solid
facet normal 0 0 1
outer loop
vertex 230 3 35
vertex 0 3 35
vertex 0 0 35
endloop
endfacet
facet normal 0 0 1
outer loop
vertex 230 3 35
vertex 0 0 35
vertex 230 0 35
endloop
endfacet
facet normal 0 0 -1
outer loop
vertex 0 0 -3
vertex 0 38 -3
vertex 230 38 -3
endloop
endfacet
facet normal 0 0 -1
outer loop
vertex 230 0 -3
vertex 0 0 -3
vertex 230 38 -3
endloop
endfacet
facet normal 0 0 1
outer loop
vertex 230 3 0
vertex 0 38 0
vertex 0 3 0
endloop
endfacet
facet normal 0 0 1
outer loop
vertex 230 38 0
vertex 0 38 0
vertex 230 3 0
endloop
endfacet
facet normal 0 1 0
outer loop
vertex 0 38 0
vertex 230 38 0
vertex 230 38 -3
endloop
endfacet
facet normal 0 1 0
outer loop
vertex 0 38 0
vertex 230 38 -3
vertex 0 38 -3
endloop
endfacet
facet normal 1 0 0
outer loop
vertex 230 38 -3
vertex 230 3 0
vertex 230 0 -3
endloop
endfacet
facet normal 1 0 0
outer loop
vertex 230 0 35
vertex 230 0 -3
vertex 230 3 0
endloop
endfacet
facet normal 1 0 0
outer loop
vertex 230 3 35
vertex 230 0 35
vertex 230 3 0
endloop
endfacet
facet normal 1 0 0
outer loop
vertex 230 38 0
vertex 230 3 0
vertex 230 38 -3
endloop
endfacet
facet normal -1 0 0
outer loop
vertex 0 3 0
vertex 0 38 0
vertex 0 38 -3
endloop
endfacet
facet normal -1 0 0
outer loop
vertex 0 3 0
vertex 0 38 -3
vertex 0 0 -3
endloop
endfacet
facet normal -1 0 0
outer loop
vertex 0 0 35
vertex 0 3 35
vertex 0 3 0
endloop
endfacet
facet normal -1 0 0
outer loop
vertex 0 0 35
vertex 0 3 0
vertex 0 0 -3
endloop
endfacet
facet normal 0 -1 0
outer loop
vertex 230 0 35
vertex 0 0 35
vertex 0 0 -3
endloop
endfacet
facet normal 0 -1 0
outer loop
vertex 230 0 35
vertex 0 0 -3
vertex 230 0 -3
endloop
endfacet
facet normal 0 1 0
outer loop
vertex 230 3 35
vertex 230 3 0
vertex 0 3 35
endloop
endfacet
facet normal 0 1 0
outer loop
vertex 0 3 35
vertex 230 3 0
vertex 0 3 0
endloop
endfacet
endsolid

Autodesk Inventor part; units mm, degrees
ref_plane "YZ Plane" through (0, 0, 0) normal (1, 0, 0) x (0, 1, 0)
ref_plane "XZ Plane" through (0, 0, 0) normal (0, 1, 0) x (-1, 0, 0)
ref_plane "XY Plane" through (0, 0, 0) normal (0, 0, 1) x (1, 0, 0)
sketch "Sketch1" plane through (0, 0, 0) normal (0, 0, 1) x (1, 0, 0)
  line L0 (0, 0) -> (230, 0)
  line L1 (230, 0) -> (230, 38)
  line L2 (230, 38) -> (0, 38)
  line L3 (0, 38) -> (0, 0)
  dimension "d0" = 230
  dimension "d1" = 38
extrude "Extrusion1" add sketch "Sketch1" against normal blind 3
sketch "Sketch2" plane through (0, 0, 0) normal (0, 0, 1) x (1, 0, 0)
  line L0 (0, 0) -> (0, 38) projected
  line L1 (0, 0) -> (230, 0)
  line L2 (230, 0) -> (230, 3)
  line L3 (230, 3) -> (0, 3)
  line L4 (0, 3) -> (0, 0)
  dimension "d4" = 230
  dimension "d5" = 3
extrude "Extrusion2" add sketch "Sketch2" along normal blind 35
properties part number "AluminiumAngle"
